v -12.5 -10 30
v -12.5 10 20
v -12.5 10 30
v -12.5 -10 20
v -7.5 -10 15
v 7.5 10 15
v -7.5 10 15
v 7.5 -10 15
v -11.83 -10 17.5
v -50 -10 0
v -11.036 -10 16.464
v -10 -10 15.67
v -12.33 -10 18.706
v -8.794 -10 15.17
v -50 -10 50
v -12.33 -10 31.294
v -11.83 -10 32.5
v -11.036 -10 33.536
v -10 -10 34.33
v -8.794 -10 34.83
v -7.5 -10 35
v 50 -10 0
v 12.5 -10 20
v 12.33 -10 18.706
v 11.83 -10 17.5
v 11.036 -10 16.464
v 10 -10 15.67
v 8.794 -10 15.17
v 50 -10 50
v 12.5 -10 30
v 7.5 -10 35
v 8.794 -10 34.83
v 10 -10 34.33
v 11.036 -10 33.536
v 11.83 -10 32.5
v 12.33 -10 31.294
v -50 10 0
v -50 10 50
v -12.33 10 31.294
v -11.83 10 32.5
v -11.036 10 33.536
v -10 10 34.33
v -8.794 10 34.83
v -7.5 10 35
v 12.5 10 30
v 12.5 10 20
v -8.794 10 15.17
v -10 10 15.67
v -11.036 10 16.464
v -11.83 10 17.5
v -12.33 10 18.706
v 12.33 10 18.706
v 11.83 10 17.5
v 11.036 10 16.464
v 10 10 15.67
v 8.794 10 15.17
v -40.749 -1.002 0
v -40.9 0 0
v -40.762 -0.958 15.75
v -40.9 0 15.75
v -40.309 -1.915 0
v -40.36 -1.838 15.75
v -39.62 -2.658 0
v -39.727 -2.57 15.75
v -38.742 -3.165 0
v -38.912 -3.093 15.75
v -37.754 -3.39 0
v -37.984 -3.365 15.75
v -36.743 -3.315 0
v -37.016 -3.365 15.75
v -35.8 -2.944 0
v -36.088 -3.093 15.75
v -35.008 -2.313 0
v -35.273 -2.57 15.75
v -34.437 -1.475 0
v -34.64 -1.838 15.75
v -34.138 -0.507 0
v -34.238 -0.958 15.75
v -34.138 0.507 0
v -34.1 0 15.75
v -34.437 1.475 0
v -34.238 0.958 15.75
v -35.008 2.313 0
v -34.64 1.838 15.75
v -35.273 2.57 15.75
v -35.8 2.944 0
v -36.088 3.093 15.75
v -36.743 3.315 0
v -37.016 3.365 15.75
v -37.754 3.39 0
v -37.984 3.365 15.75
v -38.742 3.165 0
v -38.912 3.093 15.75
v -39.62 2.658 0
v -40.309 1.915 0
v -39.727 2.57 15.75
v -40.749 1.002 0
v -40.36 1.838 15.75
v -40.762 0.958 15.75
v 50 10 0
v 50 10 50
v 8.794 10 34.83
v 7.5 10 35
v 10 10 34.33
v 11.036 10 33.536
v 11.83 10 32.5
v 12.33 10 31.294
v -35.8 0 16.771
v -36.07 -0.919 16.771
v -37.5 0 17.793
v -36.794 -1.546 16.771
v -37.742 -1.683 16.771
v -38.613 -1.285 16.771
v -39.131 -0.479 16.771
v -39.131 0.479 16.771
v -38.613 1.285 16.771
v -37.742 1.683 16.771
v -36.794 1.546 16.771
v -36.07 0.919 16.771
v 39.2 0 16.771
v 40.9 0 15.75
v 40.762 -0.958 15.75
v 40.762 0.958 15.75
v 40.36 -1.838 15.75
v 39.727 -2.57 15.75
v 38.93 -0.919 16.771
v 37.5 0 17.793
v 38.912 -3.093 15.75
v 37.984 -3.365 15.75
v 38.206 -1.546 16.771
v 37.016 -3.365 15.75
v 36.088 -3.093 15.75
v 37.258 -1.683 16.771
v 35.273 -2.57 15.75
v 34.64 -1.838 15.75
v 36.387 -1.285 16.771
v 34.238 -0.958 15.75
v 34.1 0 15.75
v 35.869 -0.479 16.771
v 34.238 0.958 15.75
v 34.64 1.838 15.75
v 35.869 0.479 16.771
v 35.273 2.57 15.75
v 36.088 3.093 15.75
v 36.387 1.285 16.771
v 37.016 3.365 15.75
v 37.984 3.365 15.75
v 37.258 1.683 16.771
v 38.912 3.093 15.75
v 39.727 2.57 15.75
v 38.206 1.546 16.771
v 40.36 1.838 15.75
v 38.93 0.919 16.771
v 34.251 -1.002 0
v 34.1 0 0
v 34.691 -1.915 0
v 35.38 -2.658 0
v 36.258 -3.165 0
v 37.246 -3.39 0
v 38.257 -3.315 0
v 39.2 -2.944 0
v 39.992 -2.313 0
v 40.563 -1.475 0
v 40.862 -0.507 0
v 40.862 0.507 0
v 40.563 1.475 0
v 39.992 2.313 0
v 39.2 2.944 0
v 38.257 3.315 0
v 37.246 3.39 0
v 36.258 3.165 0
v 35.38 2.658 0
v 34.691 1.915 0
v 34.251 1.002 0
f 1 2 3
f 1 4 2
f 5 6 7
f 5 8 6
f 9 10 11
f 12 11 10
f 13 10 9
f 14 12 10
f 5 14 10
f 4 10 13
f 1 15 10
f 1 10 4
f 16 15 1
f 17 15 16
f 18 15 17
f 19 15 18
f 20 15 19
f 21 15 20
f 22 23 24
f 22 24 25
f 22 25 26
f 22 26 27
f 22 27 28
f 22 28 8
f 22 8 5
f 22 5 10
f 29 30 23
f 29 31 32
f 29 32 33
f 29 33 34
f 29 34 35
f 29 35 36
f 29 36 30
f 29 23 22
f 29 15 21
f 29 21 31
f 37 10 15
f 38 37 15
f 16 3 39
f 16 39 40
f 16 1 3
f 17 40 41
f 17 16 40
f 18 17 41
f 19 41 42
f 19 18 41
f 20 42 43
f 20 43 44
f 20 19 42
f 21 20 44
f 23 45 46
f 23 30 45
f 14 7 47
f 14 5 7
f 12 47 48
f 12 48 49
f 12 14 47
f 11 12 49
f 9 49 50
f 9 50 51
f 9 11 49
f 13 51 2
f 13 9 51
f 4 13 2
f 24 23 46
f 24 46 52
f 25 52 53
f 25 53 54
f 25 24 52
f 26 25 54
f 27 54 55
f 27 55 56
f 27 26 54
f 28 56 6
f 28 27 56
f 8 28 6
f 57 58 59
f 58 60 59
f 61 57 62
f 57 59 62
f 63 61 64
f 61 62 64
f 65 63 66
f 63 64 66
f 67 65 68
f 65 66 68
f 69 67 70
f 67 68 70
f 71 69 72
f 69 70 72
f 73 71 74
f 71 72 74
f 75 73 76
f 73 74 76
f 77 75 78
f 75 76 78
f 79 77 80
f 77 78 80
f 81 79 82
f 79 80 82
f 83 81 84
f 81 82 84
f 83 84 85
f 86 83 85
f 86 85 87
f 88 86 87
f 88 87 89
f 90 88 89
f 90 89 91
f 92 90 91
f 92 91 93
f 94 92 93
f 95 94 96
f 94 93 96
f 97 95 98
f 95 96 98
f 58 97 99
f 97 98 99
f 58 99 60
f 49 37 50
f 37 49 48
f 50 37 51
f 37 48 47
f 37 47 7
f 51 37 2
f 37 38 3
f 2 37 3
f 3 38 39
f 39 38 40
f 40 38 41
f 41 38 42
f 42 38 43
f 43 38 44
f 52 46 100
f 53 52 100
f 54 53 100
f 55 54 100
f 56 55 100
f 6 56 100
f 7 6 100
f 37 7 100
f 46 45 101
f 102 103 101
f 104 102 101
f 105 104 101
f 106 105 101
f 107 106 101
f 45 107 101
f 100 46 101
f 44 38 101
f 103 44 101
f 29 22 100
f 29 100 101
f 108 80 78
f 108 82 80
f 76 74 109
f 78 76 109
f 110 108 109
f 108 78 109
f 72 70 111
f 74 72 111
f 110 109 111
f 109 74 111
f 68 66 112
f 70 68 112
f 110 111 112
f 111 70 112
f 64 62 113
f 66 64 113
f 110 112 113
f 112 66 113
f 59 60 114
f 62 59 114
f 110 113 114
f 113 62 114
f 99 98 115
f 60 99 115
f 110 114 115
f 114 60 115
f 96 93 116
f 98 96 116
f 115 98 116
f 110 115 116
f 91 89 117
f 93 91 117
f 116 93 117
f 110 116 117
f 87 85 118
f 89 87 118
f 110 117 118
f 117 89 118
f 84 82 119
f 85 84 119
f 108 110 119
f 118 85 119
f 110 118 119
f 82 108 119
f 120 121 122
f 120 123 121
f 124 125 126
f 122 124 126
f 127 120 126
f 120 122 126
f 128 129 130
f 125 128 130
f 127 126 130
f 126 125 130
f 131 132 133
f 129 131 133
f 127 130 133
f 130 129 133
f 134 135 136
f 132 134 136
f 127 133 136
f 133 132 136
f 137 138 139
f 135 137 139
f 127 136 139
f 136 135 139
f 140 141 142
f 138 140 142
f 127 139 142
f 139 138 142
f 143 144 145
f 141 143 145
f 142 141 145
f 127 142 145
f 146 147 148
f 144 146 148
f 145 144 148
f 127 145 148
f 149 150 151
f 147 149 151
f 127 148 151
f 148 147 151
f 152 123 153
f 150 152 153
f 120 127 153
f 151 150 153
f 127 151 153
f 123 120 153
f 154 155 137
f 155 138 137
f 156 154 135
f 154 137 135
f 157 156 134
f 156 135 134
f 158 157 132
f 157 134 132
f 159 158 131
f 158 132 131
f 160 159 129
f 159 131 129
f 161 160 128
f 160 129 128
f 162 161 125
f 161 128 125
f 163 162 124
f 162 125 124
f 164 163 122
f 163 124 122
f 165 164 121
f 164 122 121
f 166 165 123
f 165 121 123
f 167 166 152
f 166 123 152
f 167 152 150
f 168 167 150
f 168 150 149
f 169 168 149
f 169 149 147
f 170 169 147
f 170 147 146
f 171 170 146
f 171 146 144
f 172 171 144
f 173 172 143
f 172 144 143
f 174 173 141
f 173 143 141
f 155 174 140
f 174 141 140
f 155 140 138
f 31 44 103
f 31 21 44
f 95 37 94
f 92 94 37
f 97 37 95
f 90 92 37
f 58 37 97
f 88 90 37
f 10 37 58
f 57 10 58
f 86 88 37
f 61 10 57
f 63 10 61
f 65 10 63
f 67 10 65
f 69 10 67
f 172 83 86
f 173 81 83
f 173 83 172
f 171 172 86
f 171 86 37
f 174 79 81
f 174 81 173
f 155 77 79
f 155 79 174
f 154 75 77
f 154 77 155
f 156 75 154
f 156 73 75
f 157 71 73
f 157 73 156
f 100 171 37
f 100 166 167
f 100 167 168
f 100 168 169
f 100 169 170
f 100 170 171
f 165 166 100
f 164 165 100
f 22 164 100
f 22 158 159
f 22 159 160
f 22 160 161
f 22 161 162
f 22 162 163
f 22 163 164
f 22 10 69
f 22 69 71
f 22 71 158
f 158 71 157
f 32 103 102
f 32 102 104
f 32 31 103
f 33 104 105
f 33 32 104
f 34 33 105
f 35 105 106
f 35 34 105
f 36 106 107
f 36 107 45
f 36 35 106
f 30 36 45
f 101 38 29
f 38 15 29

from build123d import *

# Parameters (mm, degrees)
F0_W     = 100
F0_H     = 50
F1_DEPTH = 10
F3_D     = 6.8
F3_DEPTH = 15.75
F3_TIP   = 2.0429261047


with BuildPart() as f1:
    # F0 (on Front) → F1 (new body, symmetric)
    with BuildSketch(Plane.XZ):
        with Locations((0, 25)):
            Rectangle(F0_W, F0_H)
        with BuildLine():
            ThreePointArc((12.5, 20), (11.0355339059, 16.4644660941), (7.5, 15))
            Line((7.5, 15), (-7.5, 15))
            ThreePointArc((-7.5, 15), (-11.0355339059, 16.4644660941), (-12.5, 20))
            Line((-12.5, 20), (-12.5, 30))
            ThreePointArc((-12.5, 30), (-11.0355339059, 33.5355339059), (-7.5, 35))
            Line((-7.5, 35), (7.5, 35))
            ThreePointArc((7.5, 35), (11.0355339059, 33.5355339059), (12.5, 30))
            Line((12.5, 30), (12.5, 20))
        make_face(mode=Mode.SUBTRACT)
    extrude(amount=F1_DEPTH, both=True)

    # F3
    with Locations(Plane(origin=(0, 0, 0), x_dir=(1, 0, 0), z_dir=(0, 0, -1))):
        with Locations((-37.5, 0), (37.5, 0)):
            Hole(F3_D / 2, depth=F3_DEPTH)
            with Locations((0, 0, -(F3_DEPTH + F3_TIP / 2))):  # 118° drill point
                Cone(0, F3_D / 2, F3_TIP, mode=Mode.SUBTRACT)


solid = f1.part
